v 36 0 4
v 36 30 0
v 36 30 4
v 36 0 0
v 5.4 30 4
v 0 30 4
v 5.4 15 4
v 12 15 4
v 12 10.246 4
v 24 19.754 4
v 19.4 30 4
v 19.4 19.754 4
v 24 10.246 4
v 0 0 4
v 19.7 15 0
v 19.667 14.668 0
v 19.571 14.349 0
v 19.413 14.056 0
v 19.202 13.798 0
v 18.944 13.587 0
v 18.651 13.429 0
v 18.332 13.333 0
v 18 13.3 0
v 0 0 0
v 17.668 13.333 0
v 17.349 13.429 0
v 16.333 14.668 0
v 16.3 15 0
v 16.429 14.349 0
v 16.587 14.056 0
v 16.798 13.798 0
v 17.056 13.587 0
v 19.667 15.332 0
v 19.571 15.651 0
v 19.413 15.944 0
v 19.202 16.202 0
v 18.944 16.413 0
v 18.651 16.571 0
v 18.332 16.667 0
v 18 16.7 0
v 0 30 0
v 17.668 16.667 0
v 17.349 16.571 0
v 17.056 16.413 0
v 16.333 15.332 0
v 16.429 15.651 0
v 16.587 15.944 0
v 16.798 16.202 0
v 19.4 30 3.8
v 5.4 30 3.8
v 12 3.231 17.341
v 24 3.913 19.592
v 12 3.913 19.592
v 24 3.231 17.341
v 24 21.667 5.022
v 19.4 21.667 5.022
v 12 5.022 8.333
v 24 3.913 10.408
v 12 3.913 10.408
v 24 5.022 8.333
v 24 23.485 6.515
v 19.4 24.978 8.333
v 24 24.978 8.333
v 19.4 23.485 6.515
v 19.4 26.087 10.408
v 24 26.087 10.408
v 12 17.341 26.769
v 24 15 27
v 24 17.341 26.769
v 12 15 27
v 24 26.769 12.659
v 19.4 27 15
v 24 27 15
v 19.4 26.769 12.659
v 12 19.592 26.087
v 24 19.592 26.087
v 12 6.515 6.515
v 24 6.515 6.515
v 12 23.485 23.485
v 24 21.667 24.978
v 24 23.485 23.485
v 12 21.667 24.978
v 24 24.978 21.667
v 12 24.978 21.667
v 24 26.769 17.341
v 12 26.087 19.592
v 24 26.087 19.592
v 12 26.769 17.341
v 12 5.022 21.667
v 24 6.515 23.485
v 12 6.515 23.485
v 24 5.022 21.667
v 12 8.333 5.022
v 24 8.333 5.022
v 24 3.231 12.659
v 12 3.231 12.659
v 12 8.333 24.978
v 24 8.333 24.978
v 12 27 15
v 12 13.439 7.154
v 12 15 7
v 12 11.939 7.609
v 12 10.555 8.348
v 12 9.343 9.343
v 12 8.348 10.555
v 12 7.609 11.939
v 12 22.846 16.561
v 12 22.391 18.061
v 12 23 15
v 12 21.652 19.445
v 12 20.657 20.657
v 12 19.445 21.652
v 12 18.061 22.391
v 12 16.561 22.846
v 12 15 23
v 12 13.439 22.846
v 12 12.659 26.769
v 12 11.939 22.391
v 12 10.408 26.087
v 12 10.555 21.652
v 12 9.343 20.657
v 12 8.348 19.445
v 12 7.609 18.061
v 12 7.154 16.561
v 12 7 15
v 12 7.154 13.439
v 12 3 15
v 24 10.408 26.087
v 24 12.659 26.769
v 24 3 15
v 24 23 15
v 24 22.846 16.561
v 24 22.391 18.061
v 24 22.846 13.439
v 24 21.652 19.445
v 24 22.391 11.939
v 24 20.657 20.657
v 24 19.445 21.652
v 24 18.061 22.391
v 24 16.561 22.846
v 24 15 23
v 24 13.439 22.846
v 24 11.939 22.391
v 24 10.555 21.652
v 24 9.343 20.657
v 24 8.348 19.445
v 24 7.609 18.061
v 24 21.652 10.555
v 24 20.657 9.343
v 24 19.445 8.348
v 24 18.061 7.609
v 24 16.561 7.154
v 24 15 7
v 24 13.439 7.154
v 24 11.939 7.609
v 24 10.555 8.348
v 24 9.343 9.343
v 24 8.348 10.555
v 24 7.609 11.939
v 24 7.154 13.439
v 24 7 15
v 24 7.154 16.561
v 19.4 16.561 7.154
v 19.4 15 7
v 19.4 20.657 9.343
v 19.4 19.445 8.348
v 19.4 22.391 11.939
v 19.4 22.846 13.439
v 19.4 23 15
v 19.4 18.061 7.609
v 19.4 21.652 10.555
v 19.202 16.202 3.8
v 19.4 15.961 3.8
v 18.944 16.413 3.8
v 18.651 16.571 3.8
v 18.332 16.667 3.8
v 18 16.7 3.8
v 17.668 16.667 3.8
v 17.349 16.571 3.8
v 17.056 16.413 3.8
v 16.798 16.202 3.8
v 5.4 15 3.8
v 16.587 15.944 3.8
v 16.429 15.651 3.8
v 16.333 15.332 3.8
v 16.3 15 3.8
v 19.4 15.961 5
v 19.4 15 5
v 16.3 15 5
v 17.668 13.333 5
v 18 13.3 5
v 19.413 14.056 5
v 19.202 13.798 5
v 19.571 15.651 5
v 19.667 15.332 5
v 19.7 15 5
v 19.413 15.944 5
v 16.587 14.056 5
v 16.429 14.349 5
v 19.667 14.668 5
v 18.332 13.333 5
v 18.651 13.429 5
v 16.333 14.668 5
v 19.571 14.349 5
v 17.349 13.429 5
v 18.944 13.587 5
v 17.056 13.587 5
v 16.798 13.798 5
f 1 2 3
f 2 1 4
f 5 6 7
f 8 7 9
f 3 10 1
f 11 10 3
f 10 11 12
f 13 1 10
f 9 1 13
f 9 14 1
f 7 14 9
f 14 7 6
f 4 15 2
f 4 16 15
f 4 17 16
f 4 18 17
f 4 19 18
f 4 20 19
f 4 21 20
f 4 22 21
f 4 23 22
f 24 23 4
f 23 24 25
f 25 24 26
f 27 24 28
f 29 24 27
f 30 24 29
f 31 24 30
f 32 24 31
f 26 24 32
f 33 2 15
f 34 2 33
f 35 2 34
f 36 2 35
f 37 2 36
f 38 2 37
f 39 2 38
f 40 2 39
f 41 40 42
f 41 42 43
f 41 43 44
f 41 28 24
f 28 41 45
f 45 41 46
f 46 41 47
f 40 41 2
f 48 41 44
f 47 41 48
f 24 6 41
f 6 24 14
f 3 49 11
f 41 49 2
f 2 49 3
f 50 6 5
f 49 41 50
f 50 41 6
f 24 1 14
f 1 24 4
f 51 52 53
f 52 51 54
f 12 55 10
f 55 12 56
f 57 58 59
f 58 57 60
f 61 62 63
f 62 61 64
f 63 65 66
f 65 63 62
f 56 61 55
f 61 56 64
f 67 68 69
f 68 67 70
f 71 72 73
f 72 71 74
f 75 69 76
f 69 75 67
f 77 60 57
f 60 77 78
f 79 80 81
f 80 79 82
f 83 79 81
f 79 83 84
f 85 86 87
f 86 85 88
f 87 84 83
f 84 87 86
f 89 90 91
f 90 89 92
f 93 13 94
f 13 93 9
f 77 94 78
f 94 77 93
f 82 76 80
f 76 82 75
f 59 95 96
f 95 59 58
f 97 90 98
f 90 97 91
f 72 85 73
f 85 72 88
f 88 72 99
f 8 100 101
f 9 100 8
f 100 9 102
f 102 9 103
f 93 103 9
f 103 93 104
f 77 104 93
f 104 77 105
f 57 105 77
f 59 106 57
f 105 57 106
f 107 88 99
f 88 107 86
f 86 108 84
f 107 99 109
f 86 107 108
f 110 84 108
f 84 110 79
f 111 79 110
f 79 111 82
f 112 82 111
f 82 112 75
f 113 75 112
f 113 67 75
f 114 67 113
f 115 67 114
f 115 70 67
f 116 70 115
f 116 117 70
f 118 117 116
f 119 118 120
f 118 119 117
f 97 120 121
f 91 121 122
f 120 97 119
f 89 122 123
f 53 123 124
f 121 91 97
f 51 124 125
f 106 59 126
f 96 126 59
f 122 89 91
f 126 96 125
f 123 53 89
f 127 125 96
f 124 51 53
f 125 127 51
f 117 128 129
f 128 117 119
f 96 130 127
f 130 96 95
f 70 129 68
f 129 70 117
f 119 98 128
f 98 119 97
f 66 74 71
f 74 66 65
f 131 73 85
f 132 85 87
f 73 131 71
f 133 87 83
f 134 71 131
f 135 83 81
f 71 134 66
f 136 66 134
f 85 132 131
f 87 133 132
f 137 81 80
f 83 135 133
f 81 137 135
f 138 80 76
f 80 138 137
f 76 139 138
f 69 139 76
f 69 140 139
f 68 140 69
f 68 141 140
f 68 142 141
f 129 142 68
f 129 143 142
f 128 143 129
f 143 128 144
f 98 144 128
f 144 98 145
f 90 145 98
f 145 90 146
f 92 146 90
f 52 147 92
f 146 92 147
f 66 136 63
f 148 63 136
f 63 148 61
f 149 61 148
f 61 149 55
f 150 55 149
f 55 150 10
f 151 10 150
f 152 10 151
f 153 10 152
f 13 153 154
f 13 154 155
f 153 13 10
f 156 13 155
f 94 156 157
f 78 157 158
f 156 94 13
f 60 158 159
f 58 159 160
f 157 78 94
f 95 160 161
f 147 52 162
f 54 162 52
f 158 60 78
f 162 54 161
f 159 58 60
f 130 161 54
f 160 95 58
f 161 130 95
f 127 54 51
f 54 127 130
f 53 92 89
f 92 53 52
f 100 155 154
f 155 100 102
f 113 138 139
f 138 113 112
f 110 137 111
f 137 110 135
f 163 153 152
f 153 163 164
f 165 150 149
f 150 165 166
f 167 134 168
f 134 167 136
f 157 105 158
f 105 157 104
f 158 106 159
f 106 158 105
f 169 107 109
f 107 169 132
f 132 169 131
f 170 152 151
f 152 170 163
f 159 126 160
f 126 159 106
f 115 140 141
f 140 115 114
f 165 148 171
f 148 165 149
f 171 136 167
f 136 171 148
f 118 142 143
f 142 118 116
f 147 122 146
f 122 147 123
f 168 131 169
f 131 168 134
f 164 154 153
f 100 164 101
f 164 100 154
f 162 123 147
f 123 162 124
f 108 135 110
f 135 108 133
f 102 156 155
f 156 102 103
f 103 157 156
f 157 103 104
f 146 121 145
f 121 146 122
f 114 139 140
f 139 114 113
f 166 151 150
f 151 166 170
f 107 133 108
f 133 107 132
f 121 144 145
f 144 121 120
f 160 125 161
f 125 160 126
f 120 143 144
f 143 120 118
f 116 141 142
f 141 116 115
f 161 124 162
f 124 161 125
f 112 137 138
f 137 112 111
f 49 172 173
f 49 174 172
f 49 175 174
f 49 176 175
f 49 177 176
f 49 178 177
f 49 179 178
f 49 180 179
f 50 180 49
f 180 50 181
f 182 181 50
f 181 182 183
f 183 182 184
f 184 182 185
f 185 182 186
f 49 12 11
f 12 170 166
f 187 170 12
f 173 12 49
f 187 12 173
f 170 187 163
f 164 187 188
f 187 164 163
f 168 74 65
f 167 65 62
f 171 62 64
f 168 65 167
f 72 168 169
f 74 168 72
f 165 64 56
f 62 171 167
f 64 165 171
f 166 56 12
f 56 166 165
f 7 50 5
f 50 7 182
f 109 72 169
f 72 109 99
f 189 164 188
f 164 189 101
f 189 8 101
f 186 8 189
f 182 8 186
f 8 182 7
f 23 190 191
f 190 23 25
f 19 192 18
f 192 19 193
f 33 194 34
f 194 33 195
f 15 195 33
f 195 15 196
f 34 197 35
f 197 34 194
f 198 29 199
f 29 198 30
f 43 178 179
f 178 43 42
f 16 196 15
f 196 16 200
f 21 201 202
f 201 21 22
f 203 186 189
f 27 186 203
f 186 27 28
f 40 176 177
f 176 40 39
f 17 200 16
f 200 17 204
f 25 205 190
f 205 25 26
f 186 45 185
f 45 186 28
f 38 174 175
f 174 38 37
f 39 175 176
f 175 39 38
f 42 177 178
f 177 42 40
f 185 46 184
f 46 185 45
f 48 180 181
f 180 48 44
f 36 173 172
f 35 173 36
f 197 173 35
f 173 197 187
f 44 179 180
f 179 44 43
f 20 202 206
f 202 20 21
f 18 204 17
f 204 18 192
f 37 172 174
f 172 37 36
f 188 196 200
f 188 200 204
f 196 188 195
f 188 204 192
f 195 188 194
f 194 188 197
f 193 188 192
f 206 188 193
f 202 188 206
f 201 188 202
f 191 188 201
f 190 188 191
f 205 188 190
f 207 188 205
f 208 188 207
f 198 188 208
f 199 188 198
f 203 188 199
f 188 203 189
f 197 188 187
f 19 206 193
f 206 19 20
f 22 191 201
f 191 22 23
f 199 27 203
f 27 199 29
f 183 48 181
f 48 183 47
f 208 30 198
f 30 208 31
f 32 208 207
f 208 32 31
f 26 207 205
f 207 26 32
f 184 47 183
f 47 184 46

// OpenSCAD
$fn = 32;

// ----------------------------------------------------------------------
// Cable clip: cable 16 mm, clamp 24 mm, base 36 mm
// ----------------------------------------------------------------------

// --- parameters (mm) ---
foot_w = 36;              // base length, X
foot_d = 30;              // base width, Y
foot_t = 4;               // base thickness
hose_seat_d = 24;         // clamp outside diameter
ring_t = 4;               // clamp wall
cable_d = 16;             // cable opening
ring_w = 12;              // clamp width along the cable
screw_d = 3.4;            // screw clearance
throat = 11.2;            // snap throat width
sink = 1;                 // overlap of the clamp into the base

module base() {
  cube([foot_w, foot_d, foot_t]);
}

module clamp() {
  translate([foot_w / 2, foot_d / 2, foot_t + hose_seat_d / 2 - sink]) rotate([0, 90, 0])
    cylinder(h = ring_w, d = hose_seat_d, center = true);
}

difference() {
  union() {
    base();
    clamp();
  }
  translate([foot_w / 2, foot_d / 2, foot_t + hose_seat_d / 2 - sink]) rotate([0, 90, 0]) translate([0, 0, -ring_w / 2 - 1]) cylinder(h = ring_w + 2, d = cable_d);
  /* snap throat: the opening is narrower than the cable */
  translate([foot_w / 2 - throat / 2, foot_d / 2, foot_t + hose_seat_d / 2 - sink]) rotate([0, 90, 0]) translate([0, 0, -ring_w / 2 - 1]) cube([throat, hose_seat_d + 2, ring_w + 2]);
  translate([18, foot_d / 2, -1]) cylinder(h = foot_t + 2, d = screw_d);
}
